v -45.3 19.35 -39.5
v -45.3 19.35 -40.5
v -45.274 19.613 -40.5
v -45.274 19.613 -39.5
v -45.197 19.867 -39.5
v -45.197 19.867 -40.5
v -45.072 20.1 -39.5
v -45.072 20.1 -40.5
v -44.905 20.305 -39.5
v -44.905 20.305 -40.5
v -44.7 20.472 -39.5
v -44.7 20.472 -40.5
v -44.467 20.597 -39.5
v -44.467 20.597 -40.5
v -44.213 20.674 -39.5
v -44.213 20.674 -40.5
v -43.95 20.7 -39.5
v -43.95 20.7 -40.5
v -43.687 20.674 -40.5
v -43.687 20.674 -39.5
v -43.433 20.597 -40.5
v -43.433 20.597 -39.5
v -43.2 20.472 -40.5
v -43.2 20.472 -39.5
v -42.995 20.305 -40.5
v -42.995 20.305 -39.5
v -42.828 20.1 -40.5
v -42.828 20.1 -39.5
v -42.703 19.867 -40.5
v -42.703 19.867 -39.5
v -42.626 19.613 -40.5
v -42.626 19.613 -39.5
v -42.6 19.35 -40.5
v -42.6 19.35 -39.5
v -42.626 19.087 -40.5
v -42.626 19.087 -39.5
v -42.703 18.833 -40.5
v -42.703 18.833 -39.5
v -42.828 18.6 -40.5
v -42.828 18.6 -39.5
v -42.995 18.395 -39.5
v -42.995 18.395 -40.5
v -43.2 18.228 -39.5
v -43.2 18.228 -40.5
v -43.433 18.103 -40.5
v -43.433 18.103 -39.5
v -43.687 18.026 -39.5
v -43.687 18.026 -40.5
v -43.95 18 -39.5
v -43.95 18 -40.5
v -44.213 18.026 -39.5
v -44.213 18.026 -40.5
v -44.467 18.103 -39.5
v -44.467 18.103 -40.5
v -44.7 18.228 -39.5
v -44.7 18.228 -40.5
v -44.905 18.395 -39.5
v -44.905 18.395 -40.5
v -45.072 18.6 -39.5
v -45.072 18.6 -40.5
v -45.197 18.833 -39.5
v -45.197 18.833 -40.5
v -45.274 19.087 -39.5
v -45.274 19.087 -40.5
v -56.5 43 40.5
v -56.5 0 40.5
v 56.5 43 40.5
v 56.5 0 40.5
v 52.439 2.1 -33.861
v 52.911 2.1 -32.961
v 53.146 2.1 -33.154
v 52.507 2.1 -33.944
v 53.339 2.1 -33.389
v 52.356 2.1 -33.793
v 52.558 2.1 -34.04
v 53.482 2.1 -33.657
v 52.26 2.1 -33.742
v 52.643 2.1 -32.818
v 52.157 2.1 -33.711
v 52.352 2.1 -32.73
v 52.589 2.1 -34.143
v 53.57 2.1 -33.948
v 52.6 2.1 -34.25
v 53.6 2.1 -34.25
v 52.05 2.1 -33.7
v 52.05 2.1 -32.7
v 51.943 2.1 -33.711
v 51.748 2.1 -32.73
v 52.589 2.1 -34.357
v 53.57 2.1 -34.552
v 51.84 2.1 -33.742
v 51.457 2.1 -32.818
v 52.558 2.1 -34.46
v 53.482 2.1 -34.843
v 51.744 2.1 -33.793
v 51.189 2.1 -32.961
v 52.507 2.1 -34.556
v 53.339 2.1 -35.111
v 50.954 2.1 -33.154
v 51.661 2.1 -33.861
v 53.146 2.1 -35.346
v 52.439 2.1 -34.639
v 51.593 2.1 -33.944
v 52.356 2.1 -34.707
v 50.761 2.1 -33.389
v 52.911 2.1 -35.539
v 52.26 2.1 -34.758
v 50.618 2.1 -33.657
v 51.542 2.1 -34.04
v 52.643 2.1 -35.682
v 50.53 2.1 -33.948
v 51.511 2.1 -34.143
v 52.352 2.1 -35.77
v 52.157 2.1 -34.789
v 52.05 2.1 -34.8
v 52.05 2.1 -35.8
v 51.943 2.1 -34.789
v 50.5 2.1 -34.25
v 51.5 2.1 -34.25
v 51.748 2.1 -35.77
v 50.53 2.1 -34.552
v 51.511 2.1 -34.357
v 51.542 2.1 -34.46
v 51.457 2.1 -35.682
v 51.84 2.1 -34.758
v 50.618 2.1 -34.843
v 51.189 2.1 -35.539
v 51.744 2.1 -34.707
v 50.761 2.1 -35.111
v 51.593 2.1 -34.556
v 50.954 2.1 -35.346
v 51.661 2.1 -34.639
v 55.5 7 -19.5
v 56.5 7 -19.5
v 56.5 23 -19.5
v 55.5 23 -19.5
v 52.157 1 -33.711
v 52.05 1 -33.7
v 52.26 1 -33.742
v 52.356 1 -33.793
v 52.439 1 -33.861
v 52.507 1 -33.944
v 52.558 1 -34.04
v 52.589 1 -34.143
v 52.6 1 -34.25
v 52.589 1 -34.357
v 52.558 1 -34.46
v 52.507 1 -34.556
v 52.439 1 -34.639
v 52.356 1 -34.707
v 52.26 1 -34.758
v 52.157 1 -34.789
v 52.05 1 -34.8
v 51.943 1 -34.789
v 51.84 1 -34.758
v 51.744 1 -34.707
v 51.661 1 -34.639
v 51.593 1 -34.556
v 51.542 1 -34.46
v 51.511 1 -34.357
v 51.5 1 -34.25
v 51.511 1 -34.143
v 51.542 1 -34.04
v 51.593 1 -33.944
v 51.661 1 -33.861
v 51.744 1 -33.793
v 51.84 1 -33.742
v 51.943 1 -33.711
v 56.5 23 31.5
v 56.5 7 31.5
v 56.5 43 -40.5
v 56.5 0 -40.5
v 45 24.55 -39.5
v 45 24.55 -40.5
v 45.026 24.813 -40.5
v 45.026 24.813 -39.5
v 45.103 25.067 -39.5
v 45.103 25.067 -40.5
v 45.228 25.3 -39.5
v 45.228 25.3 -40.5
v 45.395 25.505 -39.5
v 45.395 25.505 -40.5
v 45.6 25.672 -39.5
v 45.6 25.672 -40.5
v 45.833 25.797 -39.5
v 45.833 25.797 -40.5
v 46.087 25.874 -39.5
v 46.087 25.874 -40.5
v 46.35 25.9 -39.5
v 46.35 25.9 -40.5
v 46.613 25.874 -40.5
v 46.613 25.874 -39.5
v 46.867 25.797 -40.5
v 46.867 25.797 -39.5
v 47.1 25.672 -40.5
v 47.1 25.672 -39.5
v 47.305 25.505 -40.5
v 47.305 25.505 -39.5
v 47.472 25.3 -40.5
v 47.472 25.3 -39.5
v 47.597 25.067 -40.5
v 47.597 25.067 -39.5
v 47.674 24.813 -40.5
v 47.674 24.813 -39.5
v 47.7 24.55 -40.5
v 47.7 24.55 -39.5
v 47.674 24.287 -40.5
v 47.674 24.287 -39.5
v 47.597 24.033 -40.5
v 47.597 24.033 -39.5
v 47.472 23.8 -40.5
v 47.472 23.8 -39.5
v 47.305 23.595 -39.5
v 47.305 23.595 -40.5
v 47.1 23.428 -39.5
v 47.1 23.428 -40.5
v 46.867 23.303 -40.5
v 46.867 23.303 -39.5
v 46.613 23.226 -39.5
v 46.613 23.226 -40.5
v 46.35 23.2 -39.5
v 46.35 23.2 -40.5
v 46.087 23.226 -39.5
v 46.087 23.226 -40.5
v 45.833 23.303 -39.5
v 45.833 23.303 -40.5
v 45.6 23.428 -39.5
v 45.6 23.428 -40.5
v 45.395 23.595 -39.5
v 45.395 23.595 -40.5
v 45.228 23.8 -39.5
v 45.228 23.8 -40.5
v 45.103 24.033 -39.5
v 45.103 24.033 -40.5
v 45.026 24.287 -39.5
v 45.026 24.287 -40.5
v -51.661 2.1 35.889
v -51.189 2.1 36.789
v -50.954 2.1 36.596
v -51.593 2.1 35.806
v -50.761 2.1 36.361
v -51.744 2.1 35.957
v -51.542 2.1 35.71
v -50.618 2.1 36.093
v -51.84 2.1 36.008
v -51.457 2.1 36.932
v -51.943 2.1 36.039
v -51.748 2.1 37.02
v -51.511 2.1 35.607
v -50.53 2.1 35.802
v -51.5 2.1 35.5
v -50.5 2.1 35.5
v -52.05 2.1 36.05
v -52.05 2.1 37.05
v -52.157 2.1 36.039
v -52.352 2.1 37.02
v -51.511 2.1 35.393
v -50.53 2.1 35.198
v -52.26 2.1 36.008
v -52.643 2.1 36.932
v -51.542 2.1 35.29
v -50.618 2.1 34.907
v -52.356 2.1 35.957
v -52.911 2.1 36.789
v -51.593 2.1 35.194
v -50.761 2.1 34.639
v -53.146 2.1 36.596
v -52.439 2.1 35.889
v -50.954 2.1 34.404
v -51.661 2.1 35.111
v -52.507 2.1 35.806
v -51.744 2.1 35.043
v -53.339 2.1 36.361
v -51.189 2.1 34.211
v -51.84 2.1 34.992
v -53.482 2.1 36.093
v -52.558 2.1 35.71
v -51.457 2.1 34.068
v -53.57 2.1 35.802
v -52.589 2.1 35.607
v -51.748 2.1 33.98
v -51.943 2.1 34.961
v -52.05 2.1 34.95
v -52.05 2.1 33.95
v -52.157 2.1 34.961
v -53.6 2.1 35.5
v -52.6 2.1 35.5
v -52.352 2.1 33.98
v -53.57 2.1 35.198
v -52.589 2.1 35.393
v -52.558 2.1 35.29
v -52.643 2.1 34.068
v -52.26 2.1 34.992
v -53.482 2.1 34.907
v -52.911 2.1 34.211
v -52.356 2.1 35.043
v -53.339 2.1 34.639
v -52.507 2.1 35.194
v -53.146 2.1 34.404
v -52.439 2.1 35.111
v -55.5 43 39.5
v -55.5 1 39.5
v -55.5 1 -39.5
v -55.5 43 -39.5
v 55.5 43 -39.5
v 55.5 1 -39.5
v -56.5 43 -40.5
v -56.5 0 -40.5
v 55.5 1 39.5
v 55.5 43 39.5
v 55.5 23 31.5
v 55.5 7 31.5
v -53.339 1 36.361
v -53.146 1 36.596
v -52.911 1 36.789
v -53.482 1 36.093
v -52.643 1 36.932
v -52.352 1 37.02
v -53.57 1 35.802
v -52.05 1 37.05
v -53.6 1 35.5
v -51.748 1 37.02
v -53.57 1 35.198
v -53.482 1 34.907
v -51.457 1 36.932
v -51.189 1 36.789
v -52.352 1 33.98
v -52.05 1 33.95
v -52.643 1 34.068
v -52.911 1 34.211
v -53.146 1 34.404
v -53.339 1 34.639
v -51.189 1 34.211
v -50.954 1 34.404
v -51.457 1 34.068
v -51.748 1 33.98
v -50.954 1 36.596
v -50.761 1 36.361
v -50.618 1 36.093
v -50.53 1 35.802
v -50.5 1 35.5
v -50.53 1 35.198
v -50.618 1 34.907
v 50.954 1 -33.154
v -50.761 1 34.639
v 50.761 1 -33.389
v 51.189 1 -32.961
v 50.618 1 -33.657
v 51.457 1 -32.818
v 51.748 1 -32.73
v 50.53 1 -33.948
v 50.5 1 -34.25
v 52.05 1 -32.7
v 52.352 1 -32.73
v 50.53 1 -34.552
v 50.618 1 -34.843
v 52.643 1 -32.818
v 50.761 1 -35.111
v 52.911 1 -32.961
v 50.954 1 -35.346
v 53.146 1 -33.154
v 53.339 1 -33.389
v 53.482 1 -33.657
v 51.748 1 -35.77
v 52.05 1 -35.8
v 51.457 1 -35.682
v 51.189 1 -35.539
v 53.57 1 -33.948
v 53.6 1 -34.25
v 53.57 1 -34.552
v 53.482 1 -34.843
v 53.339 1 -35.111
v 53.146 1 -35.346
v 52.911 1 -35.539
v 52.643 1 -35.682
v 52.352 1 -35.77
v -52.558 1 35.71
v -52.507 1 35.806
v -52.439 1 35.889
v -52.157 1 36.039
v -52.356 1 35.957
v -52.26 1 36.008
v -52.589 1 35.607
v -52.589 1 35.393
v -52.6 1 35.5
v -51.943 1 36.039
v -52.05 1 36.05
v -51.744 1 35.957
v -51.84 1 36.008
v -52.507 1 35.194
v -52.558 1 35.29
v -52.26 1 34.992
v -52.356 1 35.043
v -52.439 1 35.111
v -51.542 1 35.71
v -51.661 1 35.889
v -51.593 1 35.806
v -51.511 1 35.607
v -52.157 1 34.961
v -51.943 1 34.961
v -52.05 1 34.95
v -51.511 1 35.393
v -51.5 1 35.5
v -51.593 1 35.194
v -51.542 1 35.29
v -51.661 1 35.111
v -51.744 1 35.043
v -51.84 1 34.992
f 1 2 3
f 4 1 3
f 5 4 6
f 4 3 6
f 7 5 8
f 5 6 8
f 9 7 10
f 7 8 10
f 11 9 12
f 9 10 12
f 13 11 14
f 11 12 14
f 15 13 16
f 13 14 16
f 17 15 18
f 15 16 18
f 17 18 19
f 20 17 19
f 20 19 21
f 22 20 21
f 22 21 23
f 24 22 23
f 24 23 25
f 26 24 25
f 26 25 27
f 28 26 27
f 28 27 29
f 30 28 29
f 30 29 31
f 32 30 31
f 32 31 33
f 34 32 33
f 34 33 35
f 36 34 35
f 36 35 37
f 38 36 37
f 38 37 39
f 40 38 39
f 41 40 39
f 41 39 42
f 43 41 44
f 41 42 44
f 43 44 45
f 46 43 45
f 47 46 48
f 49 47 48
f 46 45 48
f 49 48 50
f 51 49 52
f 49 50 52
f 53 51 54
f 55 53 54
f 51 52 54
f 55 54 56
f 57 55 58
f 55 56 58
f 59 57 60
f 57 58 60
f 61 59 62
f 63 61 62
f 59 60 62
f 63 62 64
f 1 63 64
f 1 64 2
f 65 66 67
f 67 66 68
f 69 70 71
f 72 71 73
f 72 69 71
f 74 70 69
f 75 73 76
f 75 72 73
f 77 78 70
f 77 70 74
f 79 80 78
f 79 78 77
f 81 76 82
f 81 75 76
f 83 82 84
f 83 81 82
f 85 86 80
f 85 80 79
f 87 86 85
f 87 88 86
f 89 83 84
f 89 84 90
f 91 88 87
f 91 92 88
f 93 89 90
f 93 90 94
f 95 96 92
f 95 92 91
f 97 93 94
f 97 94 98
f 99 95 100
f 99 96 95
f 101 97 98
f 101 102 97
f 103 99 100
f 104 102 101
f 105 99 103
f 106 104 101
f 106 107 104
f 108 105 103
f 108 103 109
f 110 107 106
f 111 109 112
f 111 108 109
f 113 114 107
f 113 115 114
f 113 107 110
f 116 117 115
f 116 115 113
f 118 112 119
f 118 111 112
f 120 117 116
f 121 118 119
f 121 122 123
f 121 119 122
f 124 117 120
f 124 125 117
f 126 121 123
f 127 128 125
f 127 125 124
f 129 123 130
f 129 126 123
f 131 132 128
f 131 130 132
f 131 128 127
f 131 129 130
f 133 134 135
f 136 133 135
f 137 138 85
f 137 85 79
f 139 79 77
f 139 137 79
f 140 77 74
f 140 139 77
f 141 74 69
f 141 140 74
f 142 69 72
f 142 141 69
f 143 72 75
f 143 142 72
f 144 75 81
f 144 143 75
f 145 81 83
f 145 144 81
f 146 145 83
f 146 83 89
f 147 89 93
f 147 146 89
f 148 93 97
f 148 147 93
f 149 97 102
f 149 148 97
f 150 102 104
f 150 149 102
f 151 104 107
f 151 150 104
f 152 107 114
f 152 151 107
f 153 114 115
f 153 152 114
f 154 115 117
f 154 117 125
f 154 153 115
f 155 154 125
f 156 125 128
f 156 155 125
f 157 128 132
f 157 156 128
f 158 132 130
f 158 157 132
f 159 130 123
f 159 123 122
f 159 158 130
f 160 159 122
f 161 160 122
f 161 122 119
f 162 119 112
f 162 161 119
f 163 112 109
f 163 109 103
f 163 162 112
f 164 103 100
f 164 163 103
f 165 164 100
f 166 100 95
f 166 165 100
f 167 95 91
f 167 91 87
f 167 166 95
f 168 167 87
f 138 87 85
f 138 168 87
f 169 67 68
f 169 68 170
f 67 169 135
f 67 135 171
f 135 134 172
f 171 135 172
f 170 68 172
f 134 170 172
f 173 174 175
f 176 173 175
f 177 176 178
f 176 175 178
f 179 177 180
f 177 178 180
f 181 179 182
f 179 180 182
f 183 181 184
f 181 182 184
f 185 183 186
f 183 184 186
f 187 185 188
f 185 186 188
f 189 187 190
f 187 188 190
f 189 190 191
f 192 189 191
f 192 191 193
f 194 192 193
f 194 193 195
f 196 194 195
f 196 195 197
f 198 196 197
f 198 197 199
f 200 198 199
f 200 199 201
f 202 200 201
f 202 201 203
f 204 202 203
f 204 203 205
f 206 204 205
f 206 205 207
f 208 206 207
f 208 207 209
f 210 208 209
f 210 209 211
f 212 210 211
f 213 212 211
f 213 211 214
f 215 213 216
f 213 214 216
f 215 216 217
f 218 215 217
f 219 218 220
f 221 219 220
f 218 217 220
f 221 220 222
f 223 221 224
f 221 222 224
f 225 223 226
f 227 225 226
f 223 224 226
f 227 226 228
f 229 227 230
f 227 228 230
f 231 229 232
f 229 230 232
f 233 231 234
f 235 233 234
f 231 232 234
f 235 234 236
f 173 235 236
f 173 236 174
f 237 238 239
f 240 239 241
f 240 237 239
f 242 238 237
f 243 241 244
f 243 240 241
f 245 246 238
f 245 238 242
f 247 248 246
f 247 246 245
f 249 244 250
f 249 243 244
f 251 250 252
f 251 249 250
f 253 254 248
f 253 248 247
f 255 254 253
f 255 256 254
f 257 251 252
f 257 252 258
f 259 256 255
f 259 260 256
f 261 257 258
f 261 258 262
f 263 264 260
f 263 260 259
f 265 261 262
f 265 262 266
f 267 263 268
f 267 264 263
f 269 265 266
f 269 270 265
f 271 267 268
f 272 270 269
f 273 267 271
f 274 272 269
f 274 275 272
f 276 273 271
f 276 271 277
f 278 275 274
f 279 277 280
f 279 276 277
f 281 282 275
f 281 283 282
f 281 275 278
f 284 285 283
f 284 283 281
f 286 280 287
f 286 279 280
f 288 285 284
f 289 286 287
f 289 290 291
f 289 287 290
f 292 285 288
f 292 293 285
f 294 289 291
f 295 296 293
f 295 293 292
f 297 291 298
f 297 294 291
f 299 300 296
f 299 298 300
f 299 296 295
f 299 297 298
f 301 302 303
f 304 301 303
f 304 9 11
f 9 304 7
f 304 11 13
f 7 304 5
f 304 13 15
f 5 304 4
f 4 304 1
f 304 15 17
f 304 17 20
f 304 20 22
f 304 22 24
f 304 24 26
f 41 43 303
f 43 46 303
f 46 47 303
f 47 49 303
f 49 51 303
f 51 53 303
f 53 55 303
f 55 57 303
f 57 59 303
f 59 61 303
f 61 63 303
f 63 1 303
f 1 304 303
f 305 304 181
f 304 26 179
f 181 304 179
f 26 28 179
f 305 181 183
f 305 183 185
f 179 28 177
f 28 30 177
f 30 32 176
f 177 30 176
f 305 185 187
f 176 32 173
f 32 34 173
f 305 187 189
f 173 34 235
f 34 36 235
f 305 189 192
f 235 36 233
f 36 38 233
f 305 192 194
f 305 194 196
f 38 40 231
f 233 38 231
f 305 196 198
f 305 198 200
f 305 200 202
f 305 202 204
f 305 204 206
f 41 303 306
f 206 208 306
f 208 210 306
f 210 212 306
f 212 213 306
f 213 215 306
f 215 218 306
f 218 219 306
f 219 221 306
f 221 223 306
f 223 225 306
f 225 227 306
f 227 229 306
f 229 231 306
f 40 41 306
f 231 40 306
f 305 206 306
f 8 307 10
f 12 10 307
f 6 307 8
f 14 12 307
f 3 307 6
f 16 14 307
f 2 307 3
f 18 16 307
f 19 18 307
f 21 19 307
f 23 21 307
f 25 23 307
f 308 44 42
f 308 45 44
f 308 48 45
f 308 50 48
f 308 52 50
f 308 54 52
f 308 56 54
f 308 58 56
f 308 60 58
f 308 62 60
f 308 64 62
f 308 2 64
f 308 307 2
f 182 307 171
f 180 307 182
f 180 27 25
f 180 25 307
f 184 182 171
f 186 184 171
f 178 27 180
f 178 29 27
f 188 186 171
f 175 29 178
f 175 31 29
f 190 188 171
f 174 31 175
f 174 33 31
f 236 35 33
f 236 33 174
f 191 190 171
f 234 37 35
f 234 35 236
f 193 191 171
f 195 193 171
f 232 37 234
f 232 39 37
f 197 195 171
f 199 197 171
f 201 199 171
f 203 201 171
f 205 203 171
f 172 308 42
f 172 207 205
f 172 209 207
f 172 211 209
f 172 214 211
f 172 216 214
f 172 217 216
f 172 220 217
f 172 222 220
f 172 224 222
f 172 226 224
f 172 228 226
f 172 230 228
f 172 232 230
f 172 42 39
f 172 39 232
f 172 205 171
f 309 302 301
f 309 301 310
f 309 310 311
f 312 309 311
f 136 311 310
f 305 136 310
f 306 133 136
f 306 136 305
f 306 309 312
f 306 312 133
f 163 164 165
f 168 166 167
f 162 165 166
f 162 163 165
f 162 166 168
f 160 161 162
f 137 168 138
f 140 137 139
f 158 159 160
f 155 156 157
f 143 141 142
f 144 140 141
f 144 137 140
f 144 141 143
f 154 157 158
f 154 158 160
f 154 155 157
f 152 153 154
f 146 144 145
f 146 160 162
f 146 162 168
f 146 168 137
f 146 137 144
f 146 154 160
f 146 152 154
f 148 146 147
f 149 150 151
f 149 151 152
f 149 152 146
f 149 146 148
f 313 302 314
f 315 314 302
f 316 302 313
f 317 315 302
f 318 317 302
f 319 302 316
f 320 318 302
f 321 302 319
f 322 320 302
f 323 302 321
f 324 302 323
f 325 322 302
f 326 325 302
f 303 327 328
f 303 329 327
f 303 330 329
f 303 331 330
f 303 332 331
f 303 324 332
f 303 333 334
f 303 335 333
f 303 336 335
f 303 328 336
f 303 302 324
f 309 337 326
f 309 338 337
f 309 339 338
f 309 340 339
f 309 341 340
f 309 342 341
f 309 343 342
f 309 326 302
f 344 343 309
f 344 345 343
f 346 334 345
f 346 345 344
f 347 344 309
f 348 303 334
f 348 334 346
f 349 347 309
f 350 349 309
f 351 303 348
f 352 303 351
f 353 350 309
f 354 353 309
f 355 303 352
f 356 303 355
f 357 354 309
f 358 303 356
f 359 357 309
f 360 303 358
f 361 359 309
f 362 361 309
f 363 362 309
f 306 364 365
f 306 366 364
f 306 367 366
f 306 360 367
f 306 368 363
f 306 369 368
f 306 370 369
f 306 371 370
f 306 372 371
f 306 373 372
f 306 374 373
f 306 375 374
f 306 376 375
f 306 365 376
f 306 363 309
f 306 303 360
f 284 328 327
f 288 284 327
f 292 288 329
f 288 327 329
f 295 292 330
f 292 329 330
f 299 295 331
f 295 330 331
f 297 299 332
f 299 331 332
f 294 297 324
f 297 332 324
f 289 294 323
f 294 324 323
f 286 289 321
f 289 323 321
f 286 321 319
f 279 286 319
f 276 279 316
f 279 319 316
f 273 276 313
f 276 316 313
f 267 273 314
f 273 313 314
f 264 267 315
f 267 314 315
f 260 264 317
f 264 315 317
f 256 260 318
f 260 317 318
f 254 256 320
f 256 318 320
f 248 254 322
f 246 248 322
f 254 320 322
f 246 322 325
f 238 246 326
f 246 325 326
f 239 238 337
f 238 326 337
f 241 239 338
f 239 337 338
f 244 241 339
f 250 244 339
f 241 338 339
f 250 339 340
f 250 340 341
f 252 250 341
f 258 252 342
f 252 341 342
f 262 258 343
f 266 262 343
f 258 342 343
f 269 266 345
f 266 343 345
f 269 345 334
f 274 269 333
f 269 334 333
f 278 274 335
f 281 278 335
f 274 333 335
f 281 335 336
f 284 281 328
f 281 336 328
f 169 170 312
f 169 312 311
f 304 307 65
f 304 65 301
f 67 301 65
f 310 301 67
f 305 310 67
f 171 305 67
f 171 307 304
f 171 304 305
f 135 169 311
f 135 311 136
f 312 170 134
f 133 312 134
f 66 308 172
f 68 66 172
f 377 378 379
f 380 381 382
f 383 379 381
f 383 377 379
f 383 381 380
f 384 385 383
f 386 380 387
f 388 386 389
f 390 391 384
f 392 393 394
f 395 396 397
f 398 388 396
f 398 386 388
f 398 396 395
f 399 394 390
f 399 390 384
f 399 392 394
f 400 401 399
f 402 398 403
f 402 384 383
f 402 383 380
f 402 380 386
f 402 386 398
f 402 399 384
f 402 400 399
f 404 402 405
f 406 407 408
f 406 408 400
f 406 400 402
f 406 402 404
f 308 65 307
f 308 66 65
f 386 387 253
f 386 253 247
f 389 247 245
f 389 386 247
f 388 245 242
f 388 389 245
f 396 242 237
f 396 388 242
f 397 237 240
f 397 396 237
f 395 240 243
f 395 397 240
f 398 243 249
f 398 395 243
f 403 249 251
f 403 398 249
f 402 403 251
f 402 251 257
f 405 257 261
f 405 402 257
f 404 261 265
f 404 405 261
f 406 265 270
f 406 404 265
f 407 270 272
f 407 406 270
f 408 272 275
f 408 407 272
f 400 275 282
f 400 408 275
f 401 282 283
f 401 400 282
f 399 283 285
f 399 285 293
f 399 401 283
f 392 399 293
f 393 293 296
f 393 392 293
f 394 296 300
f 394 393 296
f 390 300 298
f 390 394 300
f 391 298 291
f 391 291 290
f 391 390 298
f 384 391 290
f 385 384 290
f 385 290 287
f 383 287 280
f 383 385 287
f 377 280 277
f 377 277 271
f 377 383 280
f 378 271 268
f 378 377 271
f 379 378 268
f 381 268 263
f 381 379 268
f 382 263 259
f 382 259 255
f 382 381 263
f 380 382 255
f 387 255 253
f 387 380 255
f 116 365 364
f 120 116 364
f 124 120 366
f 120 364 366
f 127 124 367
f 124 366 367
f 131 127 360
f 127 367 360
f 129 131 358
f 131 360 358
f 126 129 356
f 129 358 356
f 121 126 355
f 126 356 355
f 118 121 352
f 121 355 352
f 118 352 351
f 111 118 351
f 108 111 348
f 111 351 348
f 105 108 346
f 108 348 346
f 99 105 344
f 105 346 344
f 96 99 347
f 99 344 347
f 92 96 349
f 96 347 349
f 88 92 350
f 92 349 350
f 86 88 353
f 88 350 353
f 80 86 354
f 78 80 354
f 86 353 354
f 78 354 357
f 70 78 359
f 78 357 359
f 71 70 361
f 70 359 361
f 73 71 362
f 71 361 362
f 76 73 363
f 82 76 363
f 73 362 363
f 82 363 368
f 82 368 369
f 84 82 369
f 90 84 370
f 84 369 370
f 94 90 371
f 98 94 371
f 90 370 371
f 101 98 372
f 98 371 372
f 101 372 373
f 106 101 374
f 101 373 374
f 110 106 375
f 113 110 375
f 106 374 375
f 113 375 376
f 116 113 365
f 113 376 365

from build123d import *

# Parameters (mm, degrees)
SKETCH1_W           = 113
SKETCH1_H           = 81
BOSS_EXTRUDE1_DEPTH = 1
SKETCH2_W           = 113
SKETCH2_H           = 81
SKETCH2_W_2         = 111
SKETCH2_H_2         = 79
BOSS_EXTRUDE3_DEPTH = 42
CUT_EXTRUDE2_REACH  = 129.508
SKETCH3_W           = 51
SKETCH3_H           = 16
SKETCH4_R           = 1.55
SKETCH4_R_2         = 0.55
BOSS_EXTRUDE4_DEPTH = 1.1
CUT_EXTRUDE3_REACH  = 109.714
SKETCH6_R           = 1.35


with BuildPart() as part:
    # Sketch1 → Boss-Extrude1 (new body)
    with BuildSketch(Plane(origin=(0, 0, 0), x_dir=(1, 0, 0), z_dir=(0, 1, 0))):
        Rectangle(SKETCH1_W, SKETCH1_H)
    extrude(amount=BOSS_EXTRUDE1_DEPTH)

    # Sketch2 → Boss-Extrude3 (add)
    with BuildSketch(Plane(origin=(0, 1, 0), x_dir=(1, 0, 0), z_dir=(0, 1, 0))):
        Rectangle(SKETCH2_W, SKETCH2_H)
        Rectangle(SKETCH2_W_2, SKETCH2_H_2, mode=Mode.SUBTRACT)
    extrude(amount=BOSS_EXTRUDE3_DEPTH)

    # Sketch3 → Cut-Extrude2 (cut, up to next)
    with BuildSketch(Plane(origin=(56.5, 0, 0), x_dir=(0, 0, -1), z_dir=(1, 0, 0)), mode=Mode.PRIVATE) as cut_extrude2_sk1:
        with Locations((-6, 15)):
            Rectangle(SKETCH3_W, SKETCH3_H)
    cut_extrude2_tool1 = extrude(cut_extrude2_sk1.sketch, amount=-CUT_EXTRUDE2_REACH, mode=Mode.PRIVATE) & part.part
    add(cut_extrude2_tool1.solids().sort_by_distance((56.5, 15, 6))[0], mode=Mode.SUBTRACT)

    # Sketch4 → Boss-Extrude4 (add)
    # profile 1 of 2: a face of its own
    with BuildSketch(Plane(origin=(0, 1, 0), x_dir=(1, 0, 0), z_dir=(0, 1, 0))):
        with Locations(Location((52.05, 34.25, 0), (0, 0, 90))):
            Circle(SKETCH4_R)
        with Locations(Location((52.05, 34.25, 0), (0, 0, 270))):
            Circle(SKETCH4_R_2, mode=Mode.SUBTRACT)
    # profile 2 of 2: a face of its own
    with BuildSketch(Plane(origin=(0, 1, 0), x_dir=(1, 0, 0), z_dir=(0, 1, 0))):
        with Locations(Location((-52.05, -35.5, 0), (0, 0, 90))):
            Circle(SKETCH4_R)
        with Locations(Location((-52.05, -35.5, 0), (0, 0, 270))):
            Circle(SKETCH4_R_2, mode=Mode.SUBTRACT)
    extrude(amount=BOSS_EXTRUDE4_DEPTH)

    # Sketch6 → Cut-Extrude3 (cut, up to next)
    with BuildSketch(Plane(origin=(0, 0, -40.5), x_dir=(-1, 0, 0), z_dir=(0, 0, -1)), mode=Mode.PRIVATE) as cut_extrude3_sk1:
        with Locations((-46.35, 24.55)):
            Circle(SKETCH6_R)
    cut_extrude3_tool1 = extrude(cut_extrude3_sk1.sketch, amount=-CUT_EXTRUDE3_REACH, mode=Mode.PRIVATE) & part.part
    # Sketch6 → Cut-Extrude3 (cut, up to next)
    with BuildSketch(Plane(origin=(0, 0, -40.5), x_dir=(-1, 0, 0), z_dir=(0, 0, -1)), mode=Mode.PRIVATE) as cut_extrude3_sk2:
        with Locations((43.95, 19.35)):
            Circle(SKETCH6_R)
    cut_extrude3_tool2 = extrude(cut_extrude3_sk2.sketch, amount=-CUT_EXTRUDE3_REACH, mode=Mode.PRIVATE) & part.part
    add(cut_extrude3_tool1.solids().sort_by_distance((46.35, 24.55, -40.5))[0], mode=Mode.SUBTRACT)
    add(cut_extrude3_tool2.solids().sort_by_distance((-43.95, 19.35, -40.5))[0], mode=Mode.SUBTRACT)


solid = part.part
